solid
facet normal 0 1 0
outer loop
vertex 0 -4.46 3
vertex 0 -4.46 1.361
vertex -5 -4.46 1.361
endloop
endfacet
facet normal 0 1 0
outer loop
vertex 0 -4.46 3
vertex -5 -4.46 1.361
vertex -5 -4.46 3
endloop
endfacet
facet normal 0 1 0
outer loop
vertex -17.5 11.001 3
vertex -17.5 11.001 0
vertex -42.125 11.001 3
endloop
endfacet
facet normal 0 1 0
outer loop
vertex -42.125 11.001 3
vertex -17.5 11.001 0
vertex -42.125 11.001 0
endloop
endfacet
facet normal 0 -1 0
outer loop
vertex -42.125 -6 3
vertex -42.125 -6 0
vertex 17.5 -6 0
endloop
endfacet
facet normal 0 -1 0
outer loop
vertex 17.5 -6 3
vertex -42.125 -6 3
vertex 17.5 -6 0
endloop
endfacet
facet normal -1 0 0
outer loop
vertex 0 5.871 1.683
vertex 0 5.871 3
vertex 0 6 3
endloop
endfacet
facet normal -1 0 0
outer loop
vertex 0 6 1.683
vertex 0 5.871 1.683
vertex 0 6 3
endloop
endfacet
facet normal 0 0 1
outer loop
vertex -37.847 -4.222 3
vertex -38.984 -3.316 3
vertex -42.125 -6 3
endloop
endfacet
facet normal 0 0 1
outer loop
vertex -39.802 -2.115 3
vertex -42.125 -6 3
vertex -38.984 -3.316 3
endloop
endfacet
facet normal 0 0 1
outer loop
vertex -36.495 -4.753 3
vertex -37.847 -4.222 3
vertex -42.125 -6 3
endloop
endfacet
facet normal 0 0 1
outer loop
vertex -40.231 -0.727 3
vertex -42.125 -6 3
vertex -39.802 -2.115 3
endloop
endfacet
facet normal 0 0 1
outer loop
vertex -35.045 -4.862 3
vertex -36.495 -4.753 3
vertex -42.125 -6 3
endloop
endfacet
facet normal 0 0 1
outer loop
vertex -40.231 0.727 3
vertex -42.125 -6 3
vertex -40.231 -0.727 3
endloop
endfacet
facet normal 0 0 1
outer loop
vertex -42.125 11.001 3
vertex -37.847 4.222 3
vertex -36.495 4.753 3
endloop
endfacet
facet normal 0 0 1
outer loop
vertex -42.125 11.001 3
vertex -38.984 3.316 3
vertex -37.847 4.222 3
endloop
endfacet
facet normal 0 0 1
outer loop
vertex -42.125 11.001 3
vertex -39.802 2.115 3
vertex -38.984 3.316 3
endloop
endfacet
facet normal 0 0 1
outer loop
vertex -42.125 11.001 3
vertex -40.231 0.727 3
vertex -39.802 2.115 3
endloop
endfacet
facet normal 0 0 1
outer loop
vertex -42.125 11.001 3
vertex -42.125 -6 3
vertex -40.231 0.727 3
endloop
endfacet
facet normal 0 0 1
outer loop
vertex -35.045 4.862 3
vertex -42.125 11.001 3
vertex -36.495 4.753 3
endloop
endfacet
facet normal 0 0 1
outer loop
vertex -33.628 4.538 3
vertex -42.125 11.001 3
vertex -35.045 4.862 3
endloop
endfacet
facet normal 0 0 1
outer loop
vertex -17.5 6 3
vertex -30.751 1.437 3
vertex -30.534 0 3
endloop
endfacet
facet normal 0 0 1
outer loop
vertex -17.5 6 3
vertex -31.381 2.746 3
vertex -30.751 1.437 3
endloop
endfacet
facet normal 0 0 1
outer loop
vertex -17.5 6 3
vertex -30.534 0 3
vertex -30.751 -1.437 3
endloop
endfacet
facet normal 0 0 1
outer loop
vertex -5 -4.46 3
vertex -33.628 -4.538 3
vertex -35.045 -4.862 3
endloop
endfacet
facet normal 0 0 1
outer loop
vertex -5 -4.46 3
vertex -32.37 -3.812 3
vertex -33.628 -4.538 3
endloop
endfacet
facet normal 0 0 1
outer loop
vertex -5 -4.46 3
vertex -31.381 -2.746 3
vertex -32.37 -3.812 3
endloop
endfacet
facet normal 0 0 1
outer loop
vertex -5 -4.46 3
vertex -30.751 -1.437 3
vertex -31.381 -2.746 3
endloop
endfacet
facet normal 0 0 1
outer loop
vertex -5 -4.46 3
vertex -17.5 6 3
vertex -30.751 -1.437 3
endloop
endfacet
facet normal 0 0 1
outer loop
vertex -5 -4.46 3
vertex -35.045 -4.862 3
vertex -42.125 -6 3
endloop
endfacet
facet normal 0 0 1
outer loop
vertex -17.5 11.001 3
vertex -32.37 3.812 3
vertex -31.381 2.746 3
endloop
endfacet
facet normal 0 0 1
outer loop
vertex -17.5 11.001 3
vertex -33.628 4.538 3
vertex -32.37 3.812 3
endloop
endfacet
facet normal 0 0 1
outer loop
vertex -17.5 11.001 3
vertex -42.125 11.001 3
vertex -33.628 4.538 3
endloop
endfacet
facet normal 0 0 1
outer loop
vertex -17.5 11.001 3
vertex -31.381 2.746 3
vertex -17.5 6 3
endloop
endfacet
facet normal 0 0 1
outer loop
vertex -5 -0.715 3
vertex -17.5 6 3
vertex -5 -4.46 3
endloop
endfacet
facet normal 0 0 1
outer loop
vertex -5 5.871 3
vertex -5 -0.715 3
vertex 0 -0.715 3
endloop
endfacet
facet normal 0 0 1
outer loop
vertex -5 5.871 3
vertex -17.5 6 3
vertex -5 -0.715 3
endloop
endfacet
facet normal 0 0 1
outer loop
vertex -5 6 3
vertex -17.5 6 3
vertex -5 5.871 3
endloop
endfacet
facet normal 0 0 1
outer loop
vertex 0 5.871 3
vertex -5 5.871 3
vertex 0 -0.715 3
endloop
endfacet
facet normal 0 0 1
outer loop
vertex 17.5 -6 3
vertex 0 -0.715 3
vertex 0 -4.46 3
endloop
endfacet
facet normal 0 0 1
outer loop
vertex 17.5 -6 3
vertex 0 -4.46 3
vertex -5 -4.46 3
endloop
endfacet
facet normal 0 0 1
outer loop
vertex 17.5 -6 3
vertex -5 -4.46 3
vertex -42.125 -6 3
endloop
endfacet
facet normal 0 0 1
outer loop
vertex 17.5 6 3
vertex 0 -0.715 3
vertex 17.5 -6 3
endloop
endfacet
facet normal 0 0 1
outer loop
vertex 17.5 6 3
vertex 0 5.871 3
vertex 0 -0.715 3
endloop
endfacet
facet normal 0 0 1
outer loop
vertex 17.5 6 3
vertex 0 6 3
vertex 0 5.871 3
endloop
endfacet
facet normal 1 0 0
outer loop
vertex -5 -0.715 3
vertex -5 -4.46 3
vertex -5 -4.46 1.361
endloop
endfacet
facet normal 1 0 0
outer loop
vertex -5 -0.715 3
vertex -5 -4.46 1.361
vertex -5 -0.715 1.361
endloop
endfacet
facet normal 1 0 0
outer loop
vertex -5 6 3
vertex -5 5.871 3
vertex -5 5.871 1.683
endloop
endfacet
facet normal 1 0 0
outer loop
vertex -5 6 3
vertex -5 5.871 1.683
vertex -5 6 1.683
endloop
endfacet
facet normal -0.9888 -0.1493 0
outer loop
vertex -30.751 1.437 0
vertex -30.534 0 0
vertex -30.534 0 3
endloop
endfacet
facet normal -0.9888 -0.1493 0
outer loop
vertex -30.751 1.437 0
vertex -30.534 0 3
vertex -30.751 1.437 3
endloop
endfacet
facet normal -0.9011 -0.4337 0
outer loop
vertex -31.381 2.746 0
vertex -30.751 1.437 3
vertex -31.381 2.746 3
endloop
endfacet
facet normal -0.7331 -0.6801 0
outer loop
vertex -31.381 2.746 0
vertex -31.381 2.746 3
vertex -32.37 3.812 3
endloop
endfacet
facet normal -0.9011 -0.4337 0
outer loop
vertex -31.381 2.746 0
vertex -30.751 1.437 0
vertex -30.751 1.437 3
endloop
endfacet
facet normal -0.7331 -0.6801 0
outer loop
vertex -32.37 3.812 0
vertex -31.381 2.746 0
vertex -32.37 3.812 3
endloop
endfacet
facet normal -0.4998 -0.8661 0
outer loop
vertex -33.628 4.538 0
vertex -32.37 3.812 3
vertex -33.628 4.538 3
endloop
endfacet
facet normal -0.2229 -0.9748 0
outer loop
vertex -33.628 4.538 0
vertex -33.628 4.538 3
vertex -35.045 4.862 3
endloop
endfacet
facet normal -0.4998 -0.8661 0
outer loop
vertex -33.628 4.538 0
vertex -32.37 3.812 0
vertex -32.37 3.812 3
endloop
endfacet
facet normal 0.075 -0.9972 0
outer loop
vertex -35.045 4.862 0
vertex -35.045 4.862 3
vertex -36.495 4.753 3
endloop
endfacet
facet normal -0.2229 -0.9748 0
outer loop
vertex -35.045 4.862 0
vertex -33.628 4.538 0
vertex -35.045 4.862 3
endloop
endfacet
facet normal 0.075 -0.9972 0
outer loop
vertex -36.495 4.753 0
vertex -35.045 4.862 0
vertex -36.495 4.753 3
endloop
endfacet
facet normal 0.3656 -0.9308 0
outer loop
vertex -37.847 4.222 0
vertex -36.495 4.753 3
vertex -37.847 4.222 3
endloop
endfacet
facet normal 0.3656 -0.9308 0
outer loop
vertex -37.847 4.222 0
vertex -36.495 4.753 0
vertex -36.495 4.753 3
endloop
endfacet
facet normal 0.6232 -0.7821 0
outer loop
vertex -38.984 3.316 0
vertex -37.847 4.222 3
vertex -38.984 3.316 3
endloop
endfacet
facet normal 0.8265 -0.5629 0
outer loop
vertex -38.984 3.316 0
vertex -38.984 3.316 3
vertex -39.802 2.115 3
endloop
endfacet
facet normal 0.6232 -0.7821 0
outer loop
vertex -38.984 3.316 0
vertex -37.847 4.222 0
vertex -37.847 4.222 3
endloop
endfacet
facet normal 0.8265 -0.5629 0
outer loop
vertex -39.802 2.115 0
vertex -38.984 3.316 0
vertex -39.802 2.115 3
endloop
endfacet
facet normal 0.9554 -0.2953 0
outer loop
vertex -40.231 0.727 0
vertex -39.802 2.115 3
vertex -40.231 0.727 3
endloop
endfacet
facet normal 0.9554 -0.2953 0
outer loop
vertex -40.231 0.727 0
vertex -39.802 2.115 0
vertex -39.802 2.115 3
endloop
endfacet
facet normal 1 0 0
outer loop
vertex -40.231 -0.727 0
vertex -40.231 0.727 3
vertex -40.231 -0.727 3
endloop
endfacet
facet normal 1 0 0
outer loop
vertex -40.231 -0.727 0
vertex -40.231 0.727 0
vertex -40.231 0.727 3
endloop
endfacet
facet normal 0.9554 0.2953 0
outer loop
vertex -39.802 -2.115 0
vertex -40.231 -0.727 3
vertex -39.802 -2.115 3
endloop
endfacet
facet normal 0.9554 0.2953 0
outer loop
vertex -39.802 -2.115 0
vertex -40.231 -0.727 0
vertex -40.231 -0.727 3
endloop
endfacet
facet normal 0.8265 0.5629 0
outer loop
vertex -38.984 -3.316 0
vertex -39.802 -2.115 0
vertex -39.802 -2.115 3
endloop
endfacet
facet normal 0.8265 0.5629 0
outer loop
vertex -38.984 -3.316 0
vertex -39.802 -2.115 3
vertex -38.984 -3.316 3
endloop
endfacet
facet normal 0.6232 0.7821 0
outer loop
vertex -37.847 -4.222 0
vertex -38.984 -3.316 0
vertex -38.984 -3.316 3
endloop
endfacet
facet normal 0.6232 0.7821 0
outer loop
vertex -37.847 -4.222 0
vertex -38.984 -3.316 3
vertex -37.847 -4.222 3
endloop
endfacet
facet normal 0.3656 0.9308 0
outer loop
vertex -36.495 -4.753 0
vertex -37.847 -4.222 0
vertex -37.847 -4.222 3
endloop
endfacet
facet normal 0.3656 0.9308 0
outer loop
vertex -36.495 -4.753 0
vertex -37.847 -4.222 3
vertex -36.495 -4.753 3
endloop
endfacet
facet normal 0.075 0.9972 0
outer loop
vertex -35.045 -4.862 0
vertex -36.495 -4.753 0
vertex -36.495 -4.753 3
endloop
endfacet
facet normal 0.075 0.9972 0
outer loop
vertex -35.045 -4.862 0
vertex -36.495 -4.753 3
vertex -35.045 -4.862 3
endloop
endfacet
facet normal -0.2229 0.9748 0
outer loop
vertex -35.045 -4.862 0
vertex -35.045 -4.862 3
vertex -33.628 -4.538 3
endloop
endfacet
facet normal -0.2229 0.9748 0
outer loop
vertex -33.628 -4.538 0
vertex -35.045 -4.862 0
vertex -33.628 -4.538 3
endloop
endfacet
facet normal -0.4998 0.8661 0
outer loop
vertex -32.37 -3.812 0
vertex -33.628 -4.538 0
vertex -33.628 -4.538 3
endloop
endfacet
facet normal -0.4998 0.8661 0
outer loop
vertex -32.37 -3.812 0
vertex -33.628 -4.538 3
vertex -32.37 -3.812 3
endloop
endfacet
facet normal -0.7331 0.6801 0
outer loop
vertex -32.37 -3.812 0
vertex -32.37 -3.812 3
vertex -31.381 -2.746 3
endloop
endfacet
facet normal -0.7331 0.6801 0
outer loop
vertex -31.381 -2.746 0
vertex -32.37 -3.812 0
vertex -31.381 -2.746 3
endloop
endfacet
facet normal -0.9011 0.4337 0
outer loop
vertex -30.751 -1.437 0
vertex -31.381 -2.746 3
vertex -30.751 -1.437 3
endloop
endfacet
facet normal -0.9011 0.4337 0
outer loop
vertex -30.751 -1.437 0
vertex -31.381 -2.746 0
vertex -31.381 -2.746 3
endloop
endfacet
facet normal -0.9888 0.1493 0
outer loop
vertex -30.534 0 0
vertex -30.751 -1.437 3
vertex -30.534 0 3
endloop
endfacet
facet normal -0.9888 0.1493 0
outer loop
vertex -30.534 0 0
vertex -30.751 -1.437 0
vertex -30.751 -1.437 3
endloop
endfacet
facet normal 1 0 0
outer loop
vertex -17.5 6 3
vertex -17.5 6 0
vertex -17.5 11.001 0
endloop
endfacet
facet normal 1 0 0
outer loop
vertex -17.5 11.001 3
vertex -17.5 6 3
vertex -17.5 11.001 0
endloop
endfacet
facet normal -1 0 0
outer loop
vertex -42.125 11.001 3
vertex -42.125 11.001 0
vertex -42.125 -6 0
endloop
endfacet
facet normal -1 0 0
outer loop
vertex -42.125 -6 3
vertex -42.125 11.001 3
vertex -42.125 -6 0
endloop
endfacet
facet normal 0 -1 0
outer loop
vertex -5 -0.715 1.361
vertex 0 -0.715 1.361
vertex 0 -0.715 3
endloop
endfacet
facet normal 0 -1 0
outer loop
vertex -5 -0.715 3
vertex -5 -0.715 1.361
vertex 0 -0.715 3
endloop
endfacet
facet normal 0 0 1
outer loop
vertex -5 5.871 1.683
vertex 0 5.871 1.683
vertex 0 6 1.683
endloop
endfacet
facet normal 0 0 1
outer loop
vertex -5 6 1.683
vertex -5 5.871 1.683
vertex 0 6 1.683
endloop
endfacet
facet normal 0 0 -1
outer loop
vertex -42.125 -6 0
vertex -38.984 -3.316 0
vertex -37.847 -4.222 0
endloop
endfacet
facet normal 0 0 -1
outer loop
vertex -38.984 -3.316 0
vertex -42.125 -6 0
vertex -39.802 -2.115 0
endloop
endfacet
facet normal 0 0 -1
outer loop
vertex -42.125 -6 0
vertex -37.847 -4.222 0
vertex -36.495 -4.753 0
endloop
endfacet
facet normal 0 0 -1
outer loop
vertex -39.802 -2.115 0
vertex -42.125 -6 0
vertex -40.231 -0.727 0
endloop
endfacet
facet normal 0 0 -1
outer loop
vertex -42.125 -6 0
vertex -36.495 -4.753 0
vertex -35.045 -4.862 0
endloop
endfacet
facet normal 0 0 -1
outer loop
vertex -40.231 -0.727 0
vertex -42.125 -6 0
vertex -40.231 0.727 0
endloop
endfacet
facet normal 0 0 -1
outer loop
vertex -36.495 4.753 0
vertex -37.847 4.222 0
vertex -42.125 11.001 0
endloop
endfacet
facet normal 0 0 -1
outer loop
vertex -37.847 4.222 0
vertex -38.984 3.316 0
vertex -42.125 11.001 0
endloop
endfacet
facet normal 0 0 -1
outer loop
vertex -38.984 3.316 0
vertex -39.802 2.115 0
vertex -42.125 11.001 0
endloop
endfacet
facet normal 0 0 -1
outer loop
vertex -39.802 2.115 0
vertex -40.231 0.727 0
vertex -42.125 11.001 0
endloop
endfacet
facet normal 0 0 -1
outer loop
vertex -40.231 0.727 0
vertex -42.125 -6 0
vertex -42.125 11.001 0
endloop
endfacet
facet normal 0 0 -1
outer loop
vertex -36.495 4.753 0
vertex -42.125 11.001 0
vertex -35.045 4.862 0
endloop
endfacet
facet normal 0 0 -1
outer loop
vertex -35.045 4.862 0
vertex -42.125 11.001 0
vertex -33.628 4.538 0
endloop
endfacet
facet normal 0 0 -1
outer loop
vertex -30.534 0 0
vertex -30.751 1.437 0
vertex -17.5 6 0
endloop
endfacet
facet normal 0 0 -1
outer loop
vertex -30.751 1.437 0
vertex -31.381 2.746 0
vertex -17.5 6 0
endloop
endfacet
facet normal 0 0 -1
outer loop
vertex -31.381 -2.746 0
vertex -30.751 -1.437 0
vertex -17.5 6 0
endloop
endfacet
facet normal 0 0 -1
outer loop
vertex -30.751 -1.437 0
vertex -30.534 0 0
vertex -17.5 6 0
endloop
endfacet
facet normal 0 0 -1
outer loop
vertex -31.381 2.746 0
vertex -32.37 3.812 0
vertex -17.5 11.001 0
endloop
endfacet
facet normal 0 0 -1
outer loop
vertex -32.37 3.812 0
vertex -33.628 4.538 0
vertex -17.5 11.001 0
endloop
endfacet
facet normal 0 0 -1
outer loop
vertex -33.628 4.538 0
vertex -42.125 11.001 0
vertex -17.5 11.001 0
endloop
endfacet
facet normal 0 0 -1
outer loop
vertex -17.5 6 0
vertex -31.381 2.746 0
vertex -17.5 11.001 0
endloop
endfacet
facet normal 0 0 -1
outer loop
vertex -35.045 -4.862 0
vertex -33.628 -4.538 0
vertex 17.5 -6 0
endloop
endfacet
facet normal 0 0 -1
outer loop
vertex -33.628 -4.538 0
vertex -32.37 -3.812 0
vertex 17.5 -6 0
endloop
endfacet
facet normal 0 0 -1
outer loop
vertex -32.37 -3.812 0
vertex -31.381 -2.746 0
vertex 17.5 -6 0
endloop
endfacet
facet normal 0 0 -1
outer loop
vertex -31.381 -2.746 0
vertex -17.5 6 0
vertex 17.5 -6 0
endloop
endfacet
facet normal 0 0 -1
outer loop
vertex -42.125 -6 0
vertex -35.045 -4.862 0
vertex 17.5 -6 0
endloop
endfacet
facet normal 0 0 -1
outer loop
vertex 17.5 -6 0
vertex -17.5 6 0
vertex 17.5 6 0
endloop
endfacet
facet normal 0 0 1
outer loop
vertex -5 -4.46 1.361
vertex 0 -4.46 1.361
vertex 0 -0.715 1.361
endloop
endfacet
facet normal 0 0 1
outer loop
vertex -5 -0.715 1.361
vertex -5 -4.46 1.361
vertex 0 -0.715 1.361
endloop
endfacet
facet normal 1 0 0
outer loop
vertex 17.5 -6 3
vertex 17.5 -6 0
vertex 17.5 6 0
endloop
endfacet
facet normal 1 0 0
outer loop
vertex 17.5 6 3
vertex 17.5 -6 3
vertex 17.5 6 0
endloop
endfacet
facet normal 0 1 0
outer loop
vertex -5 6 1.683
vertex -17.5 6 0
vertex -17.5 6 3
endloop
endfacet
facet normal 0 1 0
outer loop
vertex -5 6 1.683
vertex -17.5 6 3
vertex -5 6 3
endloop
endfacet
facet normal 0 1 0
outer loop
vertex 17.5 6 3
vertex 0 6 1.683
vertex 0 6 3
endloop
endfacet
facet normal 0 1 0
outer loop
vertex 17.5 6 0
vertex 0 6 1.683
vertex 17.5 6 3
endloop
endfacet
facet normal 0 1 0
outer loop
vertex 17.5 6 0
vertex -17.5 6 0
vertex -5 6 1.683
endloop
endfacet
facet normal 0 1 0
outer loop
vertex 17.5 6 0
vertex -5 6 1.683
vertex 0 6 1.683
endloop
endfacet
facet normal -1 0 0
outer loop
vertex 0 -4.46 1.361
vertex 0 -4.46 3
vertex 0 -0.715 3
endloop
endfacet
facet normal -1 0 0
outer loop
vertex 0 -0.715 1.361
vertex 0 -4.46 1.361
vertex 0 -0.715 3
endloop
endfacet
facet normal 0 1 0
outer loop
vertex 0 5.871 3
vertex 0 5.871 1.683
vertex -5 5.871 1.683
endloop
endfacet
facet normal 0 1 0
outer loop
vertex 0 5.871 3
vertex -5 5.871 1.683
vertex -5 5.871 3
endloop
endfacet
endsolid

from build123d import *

# Parameters (mm, degrees)
F0_R     = 4.875428
F0_W     = 35
F0_H     = 12
F1_DEPTH = 3
F2_W     = 3.357807
F2_H     = 1.678903
F2_W_2   = 3.745247
F2_H_2   = 2.324635
F3_DEPTH = 5


with BuildPart() as f1:
    # F0 (on Top) → F1 (new body)
    with BuildSketch(Plane.XY):
        Polygon((-42.125307, -6), (-17.5, -6), (-17.5, 6), (-17.5, 11.001155), (-42.125307, 11.001155), align=None)
        with Locations((-35.409693, 0)):
            Circle(F0_R, mode=Mode.SUBTRACT)
        Rectangle(F0_W, F0_H)
    extrude(amount=F1_DEPTH)

    # F2 (on Right) → F3 (cut)
    with BuildSketch(Plane.YZ):
        with Locations((7.550389, 2.522841)):
            Rectangle(F2_W, F2_H)
        with Locations((-2.587604, 2.522841)):
            Rectangle(F2_W_2, F2_H_2)
    extrude(amount=-F3_DEPTH, mode=Mode.SUBTRACT)


solid = f1.part
